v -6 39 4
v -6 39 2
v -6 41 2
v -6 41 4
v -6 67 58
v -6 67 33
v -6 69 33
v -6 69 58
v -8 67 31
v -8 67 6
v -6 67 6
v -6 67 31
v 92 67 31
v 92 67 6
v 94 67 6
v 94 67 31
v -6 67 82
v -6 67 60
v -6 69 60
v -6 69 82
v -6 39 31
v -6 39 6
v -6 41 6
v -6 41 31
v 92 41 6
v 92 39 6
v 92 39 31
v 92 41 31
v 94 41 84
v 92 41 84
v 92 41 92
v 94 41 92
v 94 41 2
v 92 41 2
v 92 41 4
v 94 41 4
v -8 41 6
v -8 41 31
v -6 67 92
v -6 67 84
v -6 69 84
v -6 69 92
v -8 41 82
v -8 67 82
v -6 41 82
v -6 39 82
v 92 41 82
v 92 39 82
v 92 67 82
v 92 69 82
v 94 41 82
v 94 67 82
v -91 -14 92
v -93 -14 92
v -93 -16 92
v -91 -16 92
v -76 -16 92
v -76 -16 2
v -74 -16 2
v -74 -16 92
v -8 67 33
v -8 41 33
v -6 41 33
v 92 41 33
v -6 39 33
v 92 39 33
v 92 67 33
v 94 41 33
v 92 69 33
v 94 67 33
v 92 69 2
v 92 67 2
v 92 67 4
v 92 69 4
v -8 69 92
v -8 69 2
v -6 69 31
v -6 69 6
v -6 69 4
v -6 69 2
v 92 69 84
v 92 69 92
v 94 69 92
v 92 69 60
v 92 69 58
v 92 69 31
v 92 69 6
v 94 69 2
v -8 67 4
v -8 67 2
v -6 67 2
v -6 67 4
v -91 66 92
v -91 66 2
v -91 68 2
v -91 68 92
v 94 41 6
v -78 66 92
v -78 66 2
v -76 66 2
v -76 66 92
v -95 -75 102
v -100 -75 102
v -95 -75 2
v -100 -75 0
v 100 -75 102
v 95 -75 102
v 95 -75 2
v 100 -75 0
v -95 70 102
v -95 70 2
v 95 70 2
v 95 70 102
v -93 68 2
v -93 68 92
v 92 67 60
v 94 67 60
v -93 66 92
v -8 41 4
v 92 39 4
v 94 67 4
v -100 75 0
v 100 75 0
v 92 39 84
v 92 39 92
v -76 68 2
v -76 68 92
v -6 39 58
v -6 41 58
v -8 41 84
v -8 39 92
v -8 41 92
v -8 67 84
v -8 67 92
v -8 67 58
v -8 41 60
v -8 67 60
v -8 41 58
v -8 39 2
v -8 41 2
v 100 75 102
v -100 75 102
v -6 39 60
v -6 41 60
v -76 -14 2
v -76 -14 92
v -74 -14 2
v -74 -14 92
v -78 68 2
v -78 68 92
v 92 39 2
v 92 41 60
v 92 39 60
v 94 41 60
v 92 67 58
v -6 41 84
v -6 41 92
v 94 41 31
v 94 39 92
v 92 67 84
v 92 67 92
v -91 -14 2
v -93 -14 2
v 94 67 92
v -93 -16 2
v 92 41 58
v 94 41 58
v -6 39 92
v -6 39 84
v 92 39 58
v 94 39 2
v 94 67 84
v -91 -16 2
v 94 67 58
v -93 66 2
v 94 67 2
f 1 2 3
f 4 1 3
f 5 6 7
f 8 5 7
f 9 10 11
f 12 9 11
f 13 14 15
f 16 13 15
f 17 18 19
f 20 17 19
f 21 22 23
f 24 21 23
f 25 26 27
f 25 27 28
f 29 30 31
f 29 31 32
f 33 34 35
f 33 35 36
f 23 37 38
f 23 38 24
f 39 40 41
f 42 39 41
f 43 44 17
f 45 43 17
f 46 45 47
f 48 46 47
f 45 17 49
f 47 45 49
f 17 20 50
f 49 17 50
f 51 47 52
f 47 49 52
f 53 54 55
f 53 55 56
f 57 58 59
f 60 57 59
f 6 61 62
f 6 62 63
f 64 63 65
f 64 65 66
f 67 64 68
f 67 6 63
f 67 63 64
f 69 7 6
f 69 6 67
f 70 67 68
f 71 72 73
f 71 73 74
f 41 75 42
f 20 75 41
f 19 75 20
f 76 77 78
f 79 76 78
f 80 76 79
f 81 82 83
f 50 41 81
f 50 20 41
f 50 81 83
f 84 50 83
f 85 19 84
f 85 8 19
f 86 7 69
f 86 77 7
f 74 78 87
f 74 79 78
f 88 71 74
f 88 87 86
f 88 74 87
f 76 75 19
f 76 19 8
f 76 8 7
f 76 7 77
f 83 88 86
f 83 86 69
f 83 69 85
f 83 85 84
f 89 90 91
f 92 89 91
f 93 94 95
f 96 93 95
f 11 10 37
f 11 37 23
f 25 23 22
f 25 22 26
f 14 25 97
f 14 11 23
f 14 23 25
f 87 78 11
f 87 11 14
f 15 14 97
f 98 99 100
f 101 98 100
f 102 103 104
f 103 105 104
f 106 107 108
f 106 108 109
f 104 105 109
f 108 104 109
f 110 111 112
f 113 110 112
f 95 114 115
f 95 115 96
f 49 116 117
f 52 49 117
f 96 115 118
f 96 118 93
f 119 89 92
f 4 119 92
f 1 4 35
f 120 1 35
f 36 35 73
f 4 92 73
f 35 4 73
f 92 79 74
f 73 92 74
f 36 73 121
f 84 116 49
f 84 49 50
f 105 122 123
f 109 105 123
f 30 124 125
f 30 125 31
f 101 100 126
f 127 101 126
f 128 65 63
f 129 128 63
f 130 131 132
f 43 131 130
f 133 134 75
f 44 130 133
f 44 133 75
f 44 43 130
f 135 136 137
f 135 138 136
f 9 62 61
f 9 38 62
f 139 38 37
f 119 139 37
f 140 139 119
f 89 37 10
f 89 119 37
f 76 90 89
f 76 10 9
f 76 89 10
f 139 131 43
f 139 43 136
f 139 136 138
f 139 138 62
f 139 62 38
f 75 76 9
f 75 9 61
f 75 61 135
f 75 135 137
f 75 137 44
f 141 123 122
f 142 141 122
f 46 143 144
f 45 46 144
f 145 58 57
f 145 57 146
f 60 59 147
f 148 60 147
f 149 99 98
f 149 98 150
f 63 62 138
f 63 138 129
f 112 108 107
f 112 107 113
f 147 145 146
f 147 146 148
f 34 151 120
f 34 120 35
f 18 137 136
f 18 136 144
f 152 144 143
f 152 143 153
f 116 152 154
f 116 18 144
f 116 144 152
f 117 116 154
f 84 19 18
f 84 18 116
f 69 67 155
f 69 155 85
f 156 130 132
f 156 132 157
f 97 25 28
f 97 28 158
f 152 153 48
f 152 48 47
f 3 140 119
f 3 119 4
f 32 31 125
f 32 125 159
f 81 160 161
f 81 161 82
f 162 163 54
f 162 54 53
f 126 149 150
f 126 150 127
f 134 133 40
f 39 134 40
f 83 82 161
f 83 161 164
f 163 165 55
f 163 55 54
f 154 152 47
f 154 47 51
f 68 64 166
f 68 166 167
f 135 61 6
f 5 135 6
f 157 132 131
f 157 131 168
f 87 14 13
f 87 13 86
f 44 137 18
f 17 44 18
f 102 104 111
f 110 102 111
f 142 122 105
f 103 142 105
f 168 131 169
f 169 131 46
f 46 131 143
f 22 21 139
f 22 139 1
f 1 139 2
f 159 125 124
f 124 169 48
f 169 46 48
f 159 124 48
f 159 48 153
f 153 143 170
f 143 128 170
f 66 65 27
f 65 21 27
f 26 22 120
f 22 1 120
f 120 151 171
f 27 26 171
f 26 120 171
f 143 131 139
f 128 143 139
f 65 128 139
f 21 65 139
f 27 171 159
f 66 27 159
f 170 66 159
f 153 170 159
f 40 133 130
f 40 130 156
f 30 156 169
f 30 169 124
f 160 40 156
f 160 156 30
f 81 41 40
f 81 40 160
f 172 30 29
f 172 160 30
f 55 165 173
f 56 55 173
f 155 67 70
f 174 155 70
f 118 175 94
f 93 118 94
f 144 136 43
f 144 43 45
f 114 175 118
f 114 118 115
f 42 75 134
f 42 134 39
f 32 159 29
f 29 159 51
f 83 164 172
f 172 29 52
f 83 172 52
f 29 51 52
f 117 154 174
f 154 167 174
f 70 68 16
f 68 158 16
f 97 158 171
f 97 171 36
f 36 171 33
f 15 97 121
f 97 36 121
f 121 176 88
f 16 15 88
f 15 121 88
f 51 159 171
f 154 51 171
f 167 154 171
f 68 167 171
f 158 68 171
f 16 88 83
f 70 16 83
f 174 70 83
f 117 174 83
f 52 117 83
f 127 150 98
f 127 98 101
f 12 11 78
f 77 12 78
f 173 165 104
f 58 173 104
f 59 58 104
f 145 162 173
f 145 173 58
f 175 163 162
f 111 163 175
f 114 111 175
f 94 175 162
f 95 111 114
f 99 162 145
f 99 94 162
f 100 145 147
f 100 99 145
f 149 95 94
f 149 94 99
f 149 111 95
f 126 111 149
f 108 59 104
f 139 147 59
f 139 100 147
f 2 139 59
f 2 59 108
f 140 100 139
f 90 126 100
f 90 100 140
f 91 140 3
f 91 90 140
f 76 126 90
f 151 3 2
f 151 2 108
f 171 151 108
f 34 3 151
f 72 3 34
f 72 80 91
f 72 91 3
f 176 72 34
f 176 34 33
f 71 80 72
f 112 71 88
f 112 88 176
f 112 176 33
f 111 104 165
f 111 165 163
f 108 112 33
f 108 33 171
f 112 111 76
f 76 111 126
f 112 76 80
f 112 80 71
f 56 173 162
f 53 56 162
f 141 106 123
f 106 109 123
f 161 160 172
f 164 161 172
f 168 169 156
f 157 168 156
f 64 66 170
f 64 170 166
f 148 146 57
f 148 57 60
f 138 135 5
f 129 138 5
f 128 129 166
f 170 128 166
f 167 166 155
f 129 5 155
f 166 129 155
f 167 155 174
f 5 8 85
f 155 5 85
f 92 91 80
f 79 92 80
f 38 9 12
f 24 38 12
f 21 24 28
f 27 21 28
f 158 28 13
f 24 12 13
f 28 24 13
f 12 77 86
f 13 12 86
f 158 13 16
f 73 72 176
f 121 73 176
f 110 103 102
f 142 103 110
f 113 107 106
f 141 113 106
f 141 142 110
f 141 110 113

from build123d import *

# Parameters (mm, degrees)
F0_W      = 200
F0_H      = 150
F1_DEPTH  = 2
F2_W      = 5
F2_H      = 5
F2_W_2    = 190
F2_H_2    = 145
F3_DEPTH  = 100
F4_W      = 2
F4_H      = 2
F5_DEPTH  = 90
F7_W      = 2
F7_H      = 2
F8_DEPTH  = 2
F10_W     = 2
F10_H     = 2
F11_DEPTH = 2
F13_W     = 2
F13_H     = 2
F14_DEPTH = 2
F16_W     = 102
F16_H     = 30
F17_DEPTH = 2


with BuildPart() as f1:
    # F0 (on Top) → F1 (new body)
    with BuildSketch(Plane.XY):
        Rectangle(F0_W, F0_H)
    extrude(amount=F1_DEPTH)

    # F2 (on face) → F3 (join)
    with BuildSketch(Plane.XY.offset(2)):
        with Locations((-97.5, 72.5)):
            Rectangle(F2_W, F2_H)
        with Locations((0, 72.5)):
            Rectangle(F2_W_2, F2_H)
        with Locations((-97.5, -2.5)):
            Rectangle(F2_W, F2_H_2)
        with Locations((97.5, 72.5)):
            Rectangle(F2_W, F2_H)
        with Locations((97.5, -2.5)):
            Rectangle(F2_W, F2_H_2)
    extrude(amount=F3_DEPTH)

    # F4 (on face) → F5 (join)
    with BuildSketch(Plane.XY.offset(2)):
        with Locations((93, 68)):
            Rectangle(F4_W, F4_H)
        with Locations((-7, 68)):
            Rectangle(F4_W, F4_H)
        with Locations((-7, 40)):
            Rectangle(F4_W, F4_H)
        with Locations((93, 40)):
            Rectangle(F4_W, F4_H)
        with Locations((-92, 67)):
            Rectangle(F4_W, F4_H)
        with Locations((-92, -15)):
            Rectangle(F4_W, F4_H)
        with Locations((-77, 67)):
            Rectangle(F4_W, F4_H)
        with Locations((-75, -15)):
            Rectangle(F4_W, F4_H)
    extrude(amount=F5_DEPTH)

    # F7 (on offset) → F8 (join)
    with BuildSketch(Plane.XY.offset(82)):
        with Locations((-7, 40)):
            Rectangle(F7_W, F7_H)
        Polygon((-8, 69), (-8, 41), (-6, 41), (-6, 39), (94, 39), (94, 67), (92, 67), (92, 69), align=None)
        with Locations((93, 68)):
            Rectangle(F7_W, F7_H)
    extrude(amount=F8_DEPTH)

    # F10 (on offset) → F11 (join)
    with BuildSketch(Plane.XY.offset(4)):
        Polygon((92, 41), (94, 41), (94, 67), (92, 67), (92, 69), (-6, 69), (-6, 67), (-8, 67), (-8, 41), (-6, 41), (-6, 39), (92, 39), align=None)
        with Locations((93, 40)):
            Rectangle(F10_W, F10_H)
        with Locations((93, 68)):
            Rectangle(F10_W, F10_H)
        with Locations((-7, 40)):
            Rectangle(F10_W, F10_H)
        with Locations((-7, 68)):
            Rectangle(F10_W, F10_H)
    extrude(amount=F11_DEPTH)

    # F13 (on offset) → F14 (join)
    with BuildSketch(Plane.XY.offset(31)):
        Polygon((92, 41), (94, 41), (94, 67), (92, 67), (92, 69), (-6, 69), (-6, 67), (-8, 67), (-8, 41), (-6, 41), (-6, 39), (92, 39), align=None)
        with Locations((93, 40)):
            Rectangle(F13_W, F13_H)
        with Locations((93, 68)):
            Rectangle(F13_W, F13_H)
        with Locations((-7, 40)):
            Rectangle(F13_W, F13_H)
        with Locations((-7, 68)):
            Rectangle(F13_W, F13_H)
    extrude(amount=F14_DEPTH)

    # F16 (on offset) → F17 (join)
    with BuildSketch(Plane.XY.offset(58)):
        with Locations((43, 54)):
            Rectangle(F16_W, F16_H)
    extrude(amount=F17_DEPTH)


solid = f1.part
